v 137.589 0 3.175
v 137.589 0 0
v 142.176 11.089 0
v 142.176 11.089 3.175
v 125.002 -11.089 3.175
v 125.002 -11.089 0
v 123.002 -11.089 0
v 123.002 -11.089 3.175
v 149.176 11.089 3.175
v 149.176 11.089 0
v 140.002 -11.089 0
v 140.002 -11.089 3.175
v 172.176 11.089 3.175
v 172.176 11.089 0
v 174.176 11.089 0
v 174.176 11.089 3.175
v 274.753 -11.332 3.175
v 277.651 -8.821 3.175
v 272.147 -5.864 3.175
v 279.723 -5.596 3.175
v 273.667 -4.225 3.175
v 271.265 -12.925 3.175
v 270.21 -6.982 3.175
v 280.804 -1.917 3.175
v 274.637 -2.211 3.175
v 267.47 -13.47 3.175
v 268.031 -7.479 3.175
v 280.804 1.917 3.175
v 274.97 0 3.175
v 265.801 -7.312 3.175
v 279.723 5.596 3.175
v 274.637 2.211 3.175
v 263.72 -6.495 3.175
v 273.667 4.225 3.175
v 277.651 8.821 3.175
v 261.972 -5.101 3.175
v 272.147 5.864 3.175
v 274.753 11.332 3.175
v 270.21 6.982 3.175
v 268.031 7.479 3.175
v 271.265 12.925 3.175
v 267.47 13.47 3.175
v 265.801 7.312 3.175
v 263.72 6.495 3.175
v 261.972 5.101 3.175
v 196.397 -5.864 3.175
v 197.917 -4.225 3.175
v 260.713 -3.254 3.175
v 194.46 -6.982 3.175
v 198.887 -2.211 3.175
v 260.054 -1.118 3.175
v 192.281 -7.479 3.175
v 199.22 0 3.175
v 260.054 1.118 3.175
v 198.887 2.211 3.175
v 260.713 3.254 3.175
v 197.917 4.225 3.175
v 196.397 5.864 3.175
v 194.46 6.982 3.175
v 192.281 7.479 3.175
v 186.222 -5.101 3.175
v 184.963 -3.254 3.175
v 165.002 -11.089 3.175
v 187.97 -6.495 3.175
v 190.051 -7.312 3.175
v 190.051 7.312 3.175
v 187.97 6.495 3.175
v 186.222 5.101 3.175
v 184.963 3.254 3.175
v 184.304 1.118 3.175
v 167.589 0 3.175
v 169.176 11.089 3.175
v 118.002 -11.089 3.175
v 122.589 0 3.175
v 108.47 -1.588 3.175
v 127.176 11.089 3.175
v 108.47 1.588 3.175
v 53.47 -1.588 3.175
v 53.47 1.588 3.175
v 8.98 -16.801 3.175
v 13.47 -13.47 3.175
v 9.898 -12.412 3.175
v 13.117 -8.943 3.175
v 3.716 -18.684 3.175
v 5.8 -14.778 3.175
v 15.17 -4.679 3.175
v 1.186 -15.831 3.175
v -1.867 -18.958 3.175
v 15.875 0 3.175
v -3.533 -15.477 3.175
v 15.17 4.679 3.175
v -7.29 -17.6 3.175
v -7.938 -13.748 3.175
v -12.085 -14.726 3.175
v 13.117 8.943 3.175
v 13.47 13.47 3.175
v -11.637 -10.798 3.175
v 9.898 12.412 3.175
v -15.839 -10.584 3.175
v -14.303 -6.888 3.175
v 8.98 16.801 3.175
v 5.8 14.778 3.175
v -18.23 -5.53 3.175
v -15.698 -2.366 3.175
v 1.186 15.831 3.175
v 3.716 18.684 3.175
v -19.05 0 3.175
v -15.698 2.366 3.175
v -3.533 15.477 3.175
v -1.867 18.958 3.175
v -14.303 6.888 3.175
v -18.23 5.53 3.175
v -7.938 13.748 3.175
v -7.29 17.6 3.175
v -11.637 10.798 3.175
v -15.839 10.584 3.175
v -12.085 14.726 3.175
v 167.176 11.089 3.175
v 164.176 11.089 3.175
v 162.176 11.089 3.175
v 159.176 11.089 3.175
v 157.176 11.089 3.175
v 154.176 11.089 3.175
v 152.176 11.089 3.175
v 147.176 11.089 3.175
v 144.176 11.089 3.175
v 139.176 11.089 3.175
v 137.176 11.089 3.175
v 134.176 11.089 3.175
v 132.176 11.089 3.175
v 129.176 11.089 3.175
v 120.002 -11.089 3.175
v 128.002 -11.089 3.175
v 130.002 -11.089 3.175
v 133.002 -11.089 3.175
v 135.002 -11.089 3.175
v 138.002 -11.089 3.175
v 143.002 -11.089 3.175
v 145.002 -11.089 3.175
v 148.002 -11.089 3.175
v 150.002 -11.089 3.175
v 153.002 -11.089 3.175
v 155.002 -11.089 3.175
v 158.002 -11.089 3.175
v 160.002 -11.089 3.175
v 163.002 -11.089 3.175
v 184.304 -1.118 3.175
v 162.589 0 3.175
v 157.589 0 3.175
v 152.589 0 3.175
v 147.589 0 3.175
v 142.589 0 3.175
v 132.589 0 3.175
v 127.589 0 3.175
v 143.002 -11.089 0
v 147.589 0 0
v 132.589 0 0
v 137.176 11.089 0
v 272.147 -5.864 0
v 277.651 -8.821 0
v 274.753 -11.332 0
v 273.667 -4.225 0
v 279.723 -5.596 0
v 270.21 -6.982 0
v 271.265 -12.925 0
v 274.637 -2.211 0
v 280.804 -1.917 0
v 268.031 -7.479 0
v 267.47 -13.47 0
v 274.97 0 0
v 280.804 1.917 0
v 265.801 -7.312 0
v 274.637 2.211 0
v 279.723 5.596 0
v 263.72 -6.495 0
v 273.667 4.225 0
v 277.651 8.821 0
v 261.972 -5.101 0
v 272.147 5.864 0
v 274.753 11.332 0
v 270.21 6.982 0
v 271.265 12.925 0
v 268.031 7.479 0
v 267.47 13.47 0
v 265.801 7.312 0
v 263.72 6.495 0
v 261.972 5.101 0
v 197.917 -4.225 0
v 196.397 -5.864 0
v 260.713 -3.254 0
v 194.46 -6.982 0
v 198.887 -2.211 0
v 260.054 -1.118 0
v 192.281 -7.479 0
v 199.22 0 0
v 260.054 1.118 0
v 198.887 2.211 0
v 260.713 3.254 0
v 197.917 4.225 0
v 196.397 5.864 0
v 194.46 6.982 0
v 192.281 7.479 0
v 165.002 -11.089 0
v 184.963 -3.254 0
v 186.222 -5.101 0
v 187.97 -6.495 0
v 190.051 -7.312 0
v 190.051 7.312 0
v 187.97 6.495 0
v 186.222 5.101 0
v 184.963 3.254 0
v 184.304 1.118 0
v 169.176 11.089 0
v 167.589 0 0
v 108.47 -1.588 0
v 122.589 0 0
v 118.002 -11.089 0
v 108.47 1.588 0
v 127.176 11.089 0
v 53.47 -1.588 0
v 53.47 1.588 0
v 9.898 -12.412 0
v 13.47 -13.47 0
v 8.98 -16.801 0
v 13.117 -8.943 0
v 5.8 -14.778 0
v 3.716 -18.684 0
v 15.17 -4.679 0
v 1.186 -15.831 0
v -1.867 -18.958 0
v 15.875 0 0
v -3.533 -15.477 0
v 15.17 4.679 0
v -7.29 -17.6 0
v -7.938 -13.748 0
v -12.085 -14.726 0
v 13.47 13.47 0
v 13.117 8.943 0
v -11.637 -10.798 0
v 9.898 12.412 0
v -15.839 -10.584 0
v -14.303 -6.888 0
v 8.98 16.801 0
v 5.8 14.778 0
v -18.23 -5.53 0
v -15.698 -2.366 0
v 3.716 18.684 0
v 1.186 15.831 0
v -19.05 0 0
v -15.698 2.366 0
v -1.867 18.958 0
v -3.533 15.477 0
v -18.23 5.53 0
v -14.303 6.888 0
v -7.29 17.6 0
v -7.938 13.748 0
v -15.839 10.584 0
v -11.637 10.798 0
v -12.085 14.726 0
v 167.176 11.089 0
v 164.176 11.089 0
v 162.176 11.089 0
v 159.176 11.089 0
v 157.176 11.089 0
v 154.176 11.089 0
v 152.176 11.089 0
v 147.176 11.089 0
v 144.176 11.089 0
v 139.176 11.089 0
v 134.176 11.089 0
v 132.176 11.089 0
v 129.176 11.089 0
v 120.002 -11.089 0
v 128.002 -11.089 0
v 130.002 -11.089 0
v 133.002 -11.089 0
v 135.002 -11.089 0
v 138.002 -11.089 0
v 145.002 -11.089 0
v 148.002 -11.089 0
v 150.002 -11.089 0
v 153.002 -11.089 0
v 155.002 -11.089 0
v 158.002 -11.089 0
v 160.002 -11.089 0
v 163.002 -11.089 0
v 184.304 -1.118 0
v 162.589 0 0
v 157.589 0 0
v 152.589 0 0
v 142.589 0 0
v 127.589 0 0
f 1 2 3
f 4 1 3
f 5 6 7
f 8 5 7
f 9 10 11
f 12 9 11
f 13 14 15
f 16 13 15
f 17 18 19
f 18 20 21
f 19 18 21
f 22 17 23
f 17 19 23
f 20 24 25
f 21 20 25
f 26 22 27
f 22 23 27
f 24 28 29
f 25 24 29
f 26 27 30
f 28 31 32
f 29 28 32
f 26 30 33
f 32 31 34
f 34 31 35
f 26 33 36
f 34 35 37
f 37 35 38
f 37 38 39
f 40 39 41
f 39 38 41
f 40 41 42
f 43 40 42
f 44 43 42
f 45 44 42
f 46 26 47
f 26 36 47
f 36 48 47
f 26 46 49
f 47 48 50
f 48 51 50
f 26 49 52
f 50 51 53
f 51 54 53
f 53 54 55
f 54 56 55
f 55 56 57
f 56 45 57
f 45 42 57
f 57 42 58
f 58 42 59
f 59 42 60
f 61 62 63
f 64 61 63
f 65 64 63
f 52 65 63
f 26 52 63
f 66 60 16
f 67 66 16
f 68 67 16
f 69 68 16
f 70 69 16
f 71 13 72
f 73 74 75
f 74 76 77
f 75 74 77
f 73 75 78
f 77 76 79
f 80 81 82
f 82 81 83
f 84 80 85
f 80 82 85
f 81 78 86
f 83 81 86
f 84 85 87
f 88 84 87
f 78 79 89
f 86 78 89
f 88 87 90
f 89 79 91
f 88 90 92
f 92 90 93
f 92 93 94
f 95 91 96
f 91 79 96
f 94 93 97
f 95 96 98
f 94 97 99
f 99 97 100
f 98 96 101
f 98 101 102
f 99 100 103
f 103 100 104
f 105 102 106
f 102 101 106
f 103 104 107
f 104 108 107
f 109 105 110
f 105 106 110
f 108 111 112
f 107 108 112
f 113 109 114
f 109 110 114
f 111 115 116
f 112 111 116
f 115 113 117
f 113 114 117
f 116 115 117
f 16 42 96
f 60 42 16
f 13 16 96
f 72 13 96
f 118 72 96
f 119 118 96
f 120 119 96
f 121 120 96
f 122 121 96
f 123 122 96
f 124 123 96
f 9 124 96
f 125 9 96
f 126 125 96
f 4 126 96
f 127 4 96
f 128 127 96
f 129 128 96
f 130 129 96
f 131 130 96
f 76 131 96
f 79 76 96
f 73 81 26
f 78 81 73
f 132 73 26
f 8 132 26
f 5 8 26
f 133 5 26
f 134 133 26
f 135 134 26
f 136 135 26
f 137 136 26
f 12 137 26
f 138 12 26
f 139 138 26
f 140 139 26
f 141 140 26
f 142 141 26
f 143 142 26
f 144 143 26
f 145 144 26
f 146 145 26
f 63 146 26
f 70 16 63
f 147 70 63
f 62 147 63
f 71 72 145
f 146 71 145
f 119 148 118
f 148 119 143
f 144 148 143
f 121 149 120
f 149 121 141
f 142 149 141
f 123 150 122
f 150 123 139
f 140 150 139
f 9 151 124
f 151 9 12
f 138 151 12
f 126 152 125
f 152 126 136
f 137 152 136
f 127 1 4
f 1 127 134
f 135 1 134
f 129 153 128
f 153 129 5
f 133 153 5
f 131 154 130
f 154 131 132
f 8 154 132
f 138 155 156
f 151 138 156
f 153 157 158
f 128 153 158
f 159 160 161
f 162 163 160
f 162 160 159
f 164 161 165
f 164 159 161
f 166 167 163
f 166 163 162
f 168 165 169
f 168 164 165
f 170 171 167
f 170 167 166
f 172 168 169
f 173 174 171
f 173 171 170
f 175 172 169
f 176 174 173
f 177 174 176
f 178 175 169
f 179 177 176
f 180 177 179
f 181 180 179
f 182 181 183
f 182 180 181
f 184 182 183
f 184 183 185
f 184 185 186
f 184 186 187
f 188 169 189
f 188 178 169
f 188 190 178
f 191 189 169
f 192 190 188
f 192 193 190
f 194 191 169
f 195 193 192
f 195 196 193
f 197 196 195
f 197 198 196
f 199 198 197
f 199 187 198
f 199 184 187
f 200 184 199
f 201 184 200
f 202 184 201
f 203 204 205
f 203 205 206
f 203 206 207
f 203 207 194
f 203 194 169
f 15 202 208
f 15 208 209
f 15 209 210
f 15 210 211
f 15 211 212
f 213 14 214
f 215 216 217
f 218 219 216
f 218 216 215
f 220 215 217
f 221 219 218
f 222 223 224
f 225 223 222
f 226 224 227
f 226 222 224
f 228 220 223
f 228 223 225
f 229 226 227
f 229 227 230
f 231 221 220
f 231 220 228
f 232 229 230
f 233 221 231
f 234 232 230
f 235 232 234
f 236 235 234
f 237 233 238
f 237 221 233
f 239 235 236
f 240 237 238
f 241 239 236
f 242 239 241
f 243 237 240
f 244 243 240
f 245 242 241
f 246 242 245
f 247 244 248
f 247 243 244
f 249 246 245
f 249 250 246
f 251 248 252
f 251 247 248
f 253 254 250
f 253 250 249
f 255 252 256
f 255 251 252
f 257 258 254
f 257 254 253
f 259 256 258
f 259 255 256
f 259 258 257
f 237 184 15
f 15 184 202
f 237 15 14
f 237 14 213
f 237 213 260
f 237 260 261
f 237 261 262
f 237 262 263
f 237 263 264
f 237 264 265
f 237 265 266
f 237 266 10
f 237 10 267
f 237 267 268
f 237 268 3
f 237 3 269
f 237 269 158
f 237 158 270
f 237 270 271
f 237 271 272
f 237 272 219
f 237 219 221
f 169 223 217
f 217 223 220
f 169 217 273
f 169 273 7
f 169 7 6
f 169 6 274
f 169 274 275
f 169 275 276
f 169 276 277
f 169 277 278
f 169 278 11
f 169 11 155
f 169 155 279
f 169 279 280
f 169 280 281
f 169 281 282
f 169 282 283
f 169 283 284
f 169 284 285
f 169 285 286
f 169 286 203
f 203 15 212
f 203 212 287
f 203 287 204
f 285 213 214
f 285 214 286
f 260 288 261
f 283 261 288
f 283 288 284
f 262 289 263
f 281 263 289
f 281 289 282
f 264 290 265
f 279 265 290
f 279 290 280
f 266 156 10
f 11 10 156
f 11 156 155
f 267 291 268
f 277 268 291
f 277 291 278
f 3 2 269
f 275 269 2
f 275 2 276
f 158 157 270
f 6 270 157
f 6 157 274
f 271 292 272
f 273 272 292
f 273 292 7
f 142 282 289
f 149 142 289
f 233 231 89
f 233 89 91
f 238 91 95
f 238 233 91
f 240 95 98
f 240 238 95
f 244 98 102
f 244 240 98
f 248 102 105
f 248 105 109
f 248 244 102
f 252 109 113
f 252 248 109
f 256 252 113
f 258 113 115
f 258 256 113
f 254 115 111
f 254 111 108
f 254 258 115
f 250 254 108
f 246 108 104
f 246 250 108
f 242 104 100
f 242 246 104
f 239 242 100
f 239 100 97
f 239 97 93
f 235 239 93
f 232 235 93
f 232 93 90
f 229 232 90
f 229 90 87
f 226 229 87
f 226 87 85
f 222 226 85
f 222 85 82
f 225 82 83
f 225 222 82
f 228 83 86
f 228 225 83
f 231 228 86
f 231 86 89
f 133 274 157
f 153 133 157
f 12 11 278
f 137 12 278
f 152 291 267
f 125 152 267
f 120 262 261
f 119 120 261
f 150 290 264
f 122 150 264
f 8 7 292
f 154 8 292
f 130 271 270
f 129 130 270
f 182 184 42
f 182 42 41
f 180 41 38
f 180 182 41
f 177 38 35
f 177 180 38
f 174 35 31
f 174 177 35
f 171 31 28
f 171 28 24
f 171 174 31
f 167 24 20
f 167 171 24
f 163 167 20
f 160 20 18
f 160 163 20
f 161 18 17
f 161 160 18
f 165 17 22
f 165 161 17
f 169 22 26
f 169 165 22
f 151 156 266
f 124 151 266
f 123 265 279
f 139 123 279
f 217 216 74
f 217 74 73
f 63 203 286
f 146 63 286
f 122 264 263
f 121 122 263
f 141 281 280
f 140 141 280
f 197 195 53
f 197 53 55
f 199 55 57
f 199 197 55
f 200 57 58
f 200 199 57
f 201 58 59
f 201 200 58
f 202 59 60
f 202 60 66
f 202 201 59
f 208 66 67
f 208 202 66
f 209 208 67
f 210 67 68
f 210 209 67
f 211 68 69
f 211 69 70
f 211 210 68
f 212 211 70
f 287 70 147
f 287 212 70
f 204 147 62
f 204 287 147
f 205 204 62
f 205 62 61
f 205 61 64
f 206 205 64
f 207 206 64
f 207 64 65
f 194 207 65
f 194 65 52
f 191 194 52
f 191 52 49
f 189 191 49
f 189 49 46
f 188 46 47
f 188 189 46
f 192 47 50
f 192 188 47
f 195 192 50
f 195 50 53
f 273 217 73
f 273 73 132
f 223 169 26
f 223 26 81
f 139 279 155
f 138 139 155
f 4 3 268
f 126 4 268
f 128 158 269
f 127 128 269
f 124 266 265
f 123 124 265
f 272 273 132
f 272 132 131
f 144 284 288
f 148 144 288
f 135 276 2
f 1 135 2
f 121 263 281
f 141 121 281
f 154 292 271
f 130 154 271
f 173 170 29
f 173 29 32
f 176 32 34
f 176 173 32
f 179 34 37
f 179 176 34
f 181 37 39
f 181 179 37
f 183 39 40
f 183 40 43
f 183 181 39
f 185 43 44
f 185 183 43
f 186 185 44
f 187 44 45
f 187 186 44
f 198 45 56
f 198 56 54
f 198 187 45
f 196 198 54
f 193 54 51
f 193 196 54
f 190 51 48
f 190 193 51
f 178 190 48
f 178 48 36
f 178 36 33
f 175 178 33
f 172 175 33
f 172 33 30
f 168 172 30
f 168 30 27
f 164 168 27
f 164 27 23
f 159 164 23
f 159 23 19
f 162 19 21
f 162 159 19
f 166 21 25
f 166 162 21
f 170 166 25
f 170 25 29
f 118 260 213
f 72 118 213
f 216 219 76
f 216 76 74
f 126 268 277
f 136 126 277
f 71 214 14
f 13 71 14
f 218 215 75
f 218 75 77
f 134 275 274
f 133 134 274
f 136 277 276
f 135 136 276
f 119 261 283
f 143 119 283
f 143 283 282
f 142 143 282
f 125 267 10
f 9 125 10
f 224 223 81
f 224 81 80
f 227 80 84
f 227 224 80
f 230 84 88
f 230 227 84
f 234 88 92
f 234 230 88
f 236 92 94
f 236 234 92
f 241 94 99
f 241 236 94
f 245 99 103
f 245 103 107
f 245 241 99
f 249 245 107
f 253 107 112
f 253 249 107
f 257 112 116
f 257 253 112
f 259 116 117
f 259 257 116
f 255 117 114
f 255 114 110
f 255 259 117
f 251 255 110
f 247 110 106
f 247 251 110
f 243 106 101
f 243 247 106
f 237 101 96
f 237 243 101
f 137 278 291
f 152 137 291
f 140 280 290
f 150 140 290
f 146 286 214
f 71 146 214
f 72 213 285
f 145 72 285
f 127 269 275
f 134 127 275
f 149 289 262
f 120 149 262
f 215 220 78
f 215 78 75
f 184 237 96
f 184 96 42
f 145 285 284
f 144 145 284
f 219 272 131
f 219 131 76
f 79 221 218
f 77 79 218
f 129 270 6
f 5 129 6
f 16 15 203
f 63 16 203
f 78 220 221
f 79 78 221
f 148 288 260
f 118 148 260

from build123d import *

# Parameters (mm, degrees)
SKETCH1_R           = 15.875
SKETCH1_R_2         = 7.5
SKETCH1_W           = 55
SKETCH1_H           = 3.175
BOSS_EXTRUDE1_DEPTH = 3.175


with BuildPart() as part:
    # Sketch1 → Boss-Extrude1 (new body)
    with BuildSketch(Plane.XY):
        with BuildLine():
            Line((13.470384182, 13.470384182), (267.470384182, 13.470384182))
            ThreePointArc((267.470384182, 13.470384182), (280.940768363, 0), (267.470384182, -13.470384182))
            Line((267.470384182, -13.470384182), (13.470384182, -13.470384182))
            ThreePointArc((13.470384182, -13.470384182), (-19.05, 0), (13.470384182, 13.470384182))
        make_face()
        Circle(SKETCH1_R, mode=Mode.SUBTRACT)
        with Locations((267.470384182, 0)):
            Circle(SKETCH1_R_2, mode=Mode.SUBTRACT)
        with Locations((191.720384182, 0)):
            Circle(SKETCH1_R_2, mode=Mode.SUBTRACT)
        Polygon((122.588897068, 0), (118.001577828, -11.0885753), (120.001577828, -11.0885753), (129.176216309, 11.0885753), (127.176216309, 11.0885753), align=None, mode=Mode.SUBTRACT)
        with Locations((80.970384182, 0)):
            Rectangle(SKETCH1_W, SKETCH1_H, mode=Mode.SUBTRACT)
        Polygon((134.176216309, 11.0885753), (125.001577828, -11.0885753), (123.001577828, -11.0885753), (127.588897068, 0), (132.176216309, 11.0885753), align=None, mode=Mode.SUBTRACT)
        Polygon((139.176216309, 11.0885753), (130.001577828, -11.0885753), (128.001577828, -11.0885753), (132.588897068, 0), (137.176216309, 11.0885753), align=None, mode=Mode.SUBTRACT)
        Polygon((144.176216309, 11.0885753), (135.001577828, -11.0885753), (133.001577828, -11.0885753), (137.588897068, 0), (142.176216309, 11.0885753), align=None, mode=Mode.SUBTRACT)
        Polygon((149.176216309, 11.0885753), (140.001577828, -11.0885753), (138.001577828, -11.0885753), (142.588897068, 0), (147.176216309, 11.0885753), align=None, mode=Mode.SUBTRACT)
        Polygon((154.176216309, 11.0885753), (145.001577828, -11.0885753), (143.001577828, -11.0885753), (147.588897068, 0), (152.176216309, 11.0885753), align=None, mode=Mode.SUBTRACT)
        Polygon((159.176216309, 11.0885753), (150.001577828, -11.0885753), (148.001577828, -11.0885753), (152.588897068, 0), (157.176216309, 11.0885753), align=None, mode=Mode.SUBTRACT)
        Polygon((164.176216309, 11.0885753), (155.001577828, -11.0885753), (153.001577828, -11.0885753), (157.588897068, 0), (162.176216309, 11.0885753), align=None, mode=Mode.SUBTRACT)
        Polygon((169.176216309, 11.0885753), (160.001577828, -11.0885753), (158.001577828, -11.0885753), (162.588897068, 0), (167.176216309, 11.0885753), align=None, mode=Mode.SUBTRACT)
        Polygon((174.176216309, 11.0885753), (165.001577828, -11.0885753), (163.001577828, -11.0885753), (167.588897068, 0), (172.176216309, 11.0885753), align=None, mode=Mode.SUBTRACT)
    extrude(amount=BOSS_EXTRUDE1_DEPTH)


solid = part.part
